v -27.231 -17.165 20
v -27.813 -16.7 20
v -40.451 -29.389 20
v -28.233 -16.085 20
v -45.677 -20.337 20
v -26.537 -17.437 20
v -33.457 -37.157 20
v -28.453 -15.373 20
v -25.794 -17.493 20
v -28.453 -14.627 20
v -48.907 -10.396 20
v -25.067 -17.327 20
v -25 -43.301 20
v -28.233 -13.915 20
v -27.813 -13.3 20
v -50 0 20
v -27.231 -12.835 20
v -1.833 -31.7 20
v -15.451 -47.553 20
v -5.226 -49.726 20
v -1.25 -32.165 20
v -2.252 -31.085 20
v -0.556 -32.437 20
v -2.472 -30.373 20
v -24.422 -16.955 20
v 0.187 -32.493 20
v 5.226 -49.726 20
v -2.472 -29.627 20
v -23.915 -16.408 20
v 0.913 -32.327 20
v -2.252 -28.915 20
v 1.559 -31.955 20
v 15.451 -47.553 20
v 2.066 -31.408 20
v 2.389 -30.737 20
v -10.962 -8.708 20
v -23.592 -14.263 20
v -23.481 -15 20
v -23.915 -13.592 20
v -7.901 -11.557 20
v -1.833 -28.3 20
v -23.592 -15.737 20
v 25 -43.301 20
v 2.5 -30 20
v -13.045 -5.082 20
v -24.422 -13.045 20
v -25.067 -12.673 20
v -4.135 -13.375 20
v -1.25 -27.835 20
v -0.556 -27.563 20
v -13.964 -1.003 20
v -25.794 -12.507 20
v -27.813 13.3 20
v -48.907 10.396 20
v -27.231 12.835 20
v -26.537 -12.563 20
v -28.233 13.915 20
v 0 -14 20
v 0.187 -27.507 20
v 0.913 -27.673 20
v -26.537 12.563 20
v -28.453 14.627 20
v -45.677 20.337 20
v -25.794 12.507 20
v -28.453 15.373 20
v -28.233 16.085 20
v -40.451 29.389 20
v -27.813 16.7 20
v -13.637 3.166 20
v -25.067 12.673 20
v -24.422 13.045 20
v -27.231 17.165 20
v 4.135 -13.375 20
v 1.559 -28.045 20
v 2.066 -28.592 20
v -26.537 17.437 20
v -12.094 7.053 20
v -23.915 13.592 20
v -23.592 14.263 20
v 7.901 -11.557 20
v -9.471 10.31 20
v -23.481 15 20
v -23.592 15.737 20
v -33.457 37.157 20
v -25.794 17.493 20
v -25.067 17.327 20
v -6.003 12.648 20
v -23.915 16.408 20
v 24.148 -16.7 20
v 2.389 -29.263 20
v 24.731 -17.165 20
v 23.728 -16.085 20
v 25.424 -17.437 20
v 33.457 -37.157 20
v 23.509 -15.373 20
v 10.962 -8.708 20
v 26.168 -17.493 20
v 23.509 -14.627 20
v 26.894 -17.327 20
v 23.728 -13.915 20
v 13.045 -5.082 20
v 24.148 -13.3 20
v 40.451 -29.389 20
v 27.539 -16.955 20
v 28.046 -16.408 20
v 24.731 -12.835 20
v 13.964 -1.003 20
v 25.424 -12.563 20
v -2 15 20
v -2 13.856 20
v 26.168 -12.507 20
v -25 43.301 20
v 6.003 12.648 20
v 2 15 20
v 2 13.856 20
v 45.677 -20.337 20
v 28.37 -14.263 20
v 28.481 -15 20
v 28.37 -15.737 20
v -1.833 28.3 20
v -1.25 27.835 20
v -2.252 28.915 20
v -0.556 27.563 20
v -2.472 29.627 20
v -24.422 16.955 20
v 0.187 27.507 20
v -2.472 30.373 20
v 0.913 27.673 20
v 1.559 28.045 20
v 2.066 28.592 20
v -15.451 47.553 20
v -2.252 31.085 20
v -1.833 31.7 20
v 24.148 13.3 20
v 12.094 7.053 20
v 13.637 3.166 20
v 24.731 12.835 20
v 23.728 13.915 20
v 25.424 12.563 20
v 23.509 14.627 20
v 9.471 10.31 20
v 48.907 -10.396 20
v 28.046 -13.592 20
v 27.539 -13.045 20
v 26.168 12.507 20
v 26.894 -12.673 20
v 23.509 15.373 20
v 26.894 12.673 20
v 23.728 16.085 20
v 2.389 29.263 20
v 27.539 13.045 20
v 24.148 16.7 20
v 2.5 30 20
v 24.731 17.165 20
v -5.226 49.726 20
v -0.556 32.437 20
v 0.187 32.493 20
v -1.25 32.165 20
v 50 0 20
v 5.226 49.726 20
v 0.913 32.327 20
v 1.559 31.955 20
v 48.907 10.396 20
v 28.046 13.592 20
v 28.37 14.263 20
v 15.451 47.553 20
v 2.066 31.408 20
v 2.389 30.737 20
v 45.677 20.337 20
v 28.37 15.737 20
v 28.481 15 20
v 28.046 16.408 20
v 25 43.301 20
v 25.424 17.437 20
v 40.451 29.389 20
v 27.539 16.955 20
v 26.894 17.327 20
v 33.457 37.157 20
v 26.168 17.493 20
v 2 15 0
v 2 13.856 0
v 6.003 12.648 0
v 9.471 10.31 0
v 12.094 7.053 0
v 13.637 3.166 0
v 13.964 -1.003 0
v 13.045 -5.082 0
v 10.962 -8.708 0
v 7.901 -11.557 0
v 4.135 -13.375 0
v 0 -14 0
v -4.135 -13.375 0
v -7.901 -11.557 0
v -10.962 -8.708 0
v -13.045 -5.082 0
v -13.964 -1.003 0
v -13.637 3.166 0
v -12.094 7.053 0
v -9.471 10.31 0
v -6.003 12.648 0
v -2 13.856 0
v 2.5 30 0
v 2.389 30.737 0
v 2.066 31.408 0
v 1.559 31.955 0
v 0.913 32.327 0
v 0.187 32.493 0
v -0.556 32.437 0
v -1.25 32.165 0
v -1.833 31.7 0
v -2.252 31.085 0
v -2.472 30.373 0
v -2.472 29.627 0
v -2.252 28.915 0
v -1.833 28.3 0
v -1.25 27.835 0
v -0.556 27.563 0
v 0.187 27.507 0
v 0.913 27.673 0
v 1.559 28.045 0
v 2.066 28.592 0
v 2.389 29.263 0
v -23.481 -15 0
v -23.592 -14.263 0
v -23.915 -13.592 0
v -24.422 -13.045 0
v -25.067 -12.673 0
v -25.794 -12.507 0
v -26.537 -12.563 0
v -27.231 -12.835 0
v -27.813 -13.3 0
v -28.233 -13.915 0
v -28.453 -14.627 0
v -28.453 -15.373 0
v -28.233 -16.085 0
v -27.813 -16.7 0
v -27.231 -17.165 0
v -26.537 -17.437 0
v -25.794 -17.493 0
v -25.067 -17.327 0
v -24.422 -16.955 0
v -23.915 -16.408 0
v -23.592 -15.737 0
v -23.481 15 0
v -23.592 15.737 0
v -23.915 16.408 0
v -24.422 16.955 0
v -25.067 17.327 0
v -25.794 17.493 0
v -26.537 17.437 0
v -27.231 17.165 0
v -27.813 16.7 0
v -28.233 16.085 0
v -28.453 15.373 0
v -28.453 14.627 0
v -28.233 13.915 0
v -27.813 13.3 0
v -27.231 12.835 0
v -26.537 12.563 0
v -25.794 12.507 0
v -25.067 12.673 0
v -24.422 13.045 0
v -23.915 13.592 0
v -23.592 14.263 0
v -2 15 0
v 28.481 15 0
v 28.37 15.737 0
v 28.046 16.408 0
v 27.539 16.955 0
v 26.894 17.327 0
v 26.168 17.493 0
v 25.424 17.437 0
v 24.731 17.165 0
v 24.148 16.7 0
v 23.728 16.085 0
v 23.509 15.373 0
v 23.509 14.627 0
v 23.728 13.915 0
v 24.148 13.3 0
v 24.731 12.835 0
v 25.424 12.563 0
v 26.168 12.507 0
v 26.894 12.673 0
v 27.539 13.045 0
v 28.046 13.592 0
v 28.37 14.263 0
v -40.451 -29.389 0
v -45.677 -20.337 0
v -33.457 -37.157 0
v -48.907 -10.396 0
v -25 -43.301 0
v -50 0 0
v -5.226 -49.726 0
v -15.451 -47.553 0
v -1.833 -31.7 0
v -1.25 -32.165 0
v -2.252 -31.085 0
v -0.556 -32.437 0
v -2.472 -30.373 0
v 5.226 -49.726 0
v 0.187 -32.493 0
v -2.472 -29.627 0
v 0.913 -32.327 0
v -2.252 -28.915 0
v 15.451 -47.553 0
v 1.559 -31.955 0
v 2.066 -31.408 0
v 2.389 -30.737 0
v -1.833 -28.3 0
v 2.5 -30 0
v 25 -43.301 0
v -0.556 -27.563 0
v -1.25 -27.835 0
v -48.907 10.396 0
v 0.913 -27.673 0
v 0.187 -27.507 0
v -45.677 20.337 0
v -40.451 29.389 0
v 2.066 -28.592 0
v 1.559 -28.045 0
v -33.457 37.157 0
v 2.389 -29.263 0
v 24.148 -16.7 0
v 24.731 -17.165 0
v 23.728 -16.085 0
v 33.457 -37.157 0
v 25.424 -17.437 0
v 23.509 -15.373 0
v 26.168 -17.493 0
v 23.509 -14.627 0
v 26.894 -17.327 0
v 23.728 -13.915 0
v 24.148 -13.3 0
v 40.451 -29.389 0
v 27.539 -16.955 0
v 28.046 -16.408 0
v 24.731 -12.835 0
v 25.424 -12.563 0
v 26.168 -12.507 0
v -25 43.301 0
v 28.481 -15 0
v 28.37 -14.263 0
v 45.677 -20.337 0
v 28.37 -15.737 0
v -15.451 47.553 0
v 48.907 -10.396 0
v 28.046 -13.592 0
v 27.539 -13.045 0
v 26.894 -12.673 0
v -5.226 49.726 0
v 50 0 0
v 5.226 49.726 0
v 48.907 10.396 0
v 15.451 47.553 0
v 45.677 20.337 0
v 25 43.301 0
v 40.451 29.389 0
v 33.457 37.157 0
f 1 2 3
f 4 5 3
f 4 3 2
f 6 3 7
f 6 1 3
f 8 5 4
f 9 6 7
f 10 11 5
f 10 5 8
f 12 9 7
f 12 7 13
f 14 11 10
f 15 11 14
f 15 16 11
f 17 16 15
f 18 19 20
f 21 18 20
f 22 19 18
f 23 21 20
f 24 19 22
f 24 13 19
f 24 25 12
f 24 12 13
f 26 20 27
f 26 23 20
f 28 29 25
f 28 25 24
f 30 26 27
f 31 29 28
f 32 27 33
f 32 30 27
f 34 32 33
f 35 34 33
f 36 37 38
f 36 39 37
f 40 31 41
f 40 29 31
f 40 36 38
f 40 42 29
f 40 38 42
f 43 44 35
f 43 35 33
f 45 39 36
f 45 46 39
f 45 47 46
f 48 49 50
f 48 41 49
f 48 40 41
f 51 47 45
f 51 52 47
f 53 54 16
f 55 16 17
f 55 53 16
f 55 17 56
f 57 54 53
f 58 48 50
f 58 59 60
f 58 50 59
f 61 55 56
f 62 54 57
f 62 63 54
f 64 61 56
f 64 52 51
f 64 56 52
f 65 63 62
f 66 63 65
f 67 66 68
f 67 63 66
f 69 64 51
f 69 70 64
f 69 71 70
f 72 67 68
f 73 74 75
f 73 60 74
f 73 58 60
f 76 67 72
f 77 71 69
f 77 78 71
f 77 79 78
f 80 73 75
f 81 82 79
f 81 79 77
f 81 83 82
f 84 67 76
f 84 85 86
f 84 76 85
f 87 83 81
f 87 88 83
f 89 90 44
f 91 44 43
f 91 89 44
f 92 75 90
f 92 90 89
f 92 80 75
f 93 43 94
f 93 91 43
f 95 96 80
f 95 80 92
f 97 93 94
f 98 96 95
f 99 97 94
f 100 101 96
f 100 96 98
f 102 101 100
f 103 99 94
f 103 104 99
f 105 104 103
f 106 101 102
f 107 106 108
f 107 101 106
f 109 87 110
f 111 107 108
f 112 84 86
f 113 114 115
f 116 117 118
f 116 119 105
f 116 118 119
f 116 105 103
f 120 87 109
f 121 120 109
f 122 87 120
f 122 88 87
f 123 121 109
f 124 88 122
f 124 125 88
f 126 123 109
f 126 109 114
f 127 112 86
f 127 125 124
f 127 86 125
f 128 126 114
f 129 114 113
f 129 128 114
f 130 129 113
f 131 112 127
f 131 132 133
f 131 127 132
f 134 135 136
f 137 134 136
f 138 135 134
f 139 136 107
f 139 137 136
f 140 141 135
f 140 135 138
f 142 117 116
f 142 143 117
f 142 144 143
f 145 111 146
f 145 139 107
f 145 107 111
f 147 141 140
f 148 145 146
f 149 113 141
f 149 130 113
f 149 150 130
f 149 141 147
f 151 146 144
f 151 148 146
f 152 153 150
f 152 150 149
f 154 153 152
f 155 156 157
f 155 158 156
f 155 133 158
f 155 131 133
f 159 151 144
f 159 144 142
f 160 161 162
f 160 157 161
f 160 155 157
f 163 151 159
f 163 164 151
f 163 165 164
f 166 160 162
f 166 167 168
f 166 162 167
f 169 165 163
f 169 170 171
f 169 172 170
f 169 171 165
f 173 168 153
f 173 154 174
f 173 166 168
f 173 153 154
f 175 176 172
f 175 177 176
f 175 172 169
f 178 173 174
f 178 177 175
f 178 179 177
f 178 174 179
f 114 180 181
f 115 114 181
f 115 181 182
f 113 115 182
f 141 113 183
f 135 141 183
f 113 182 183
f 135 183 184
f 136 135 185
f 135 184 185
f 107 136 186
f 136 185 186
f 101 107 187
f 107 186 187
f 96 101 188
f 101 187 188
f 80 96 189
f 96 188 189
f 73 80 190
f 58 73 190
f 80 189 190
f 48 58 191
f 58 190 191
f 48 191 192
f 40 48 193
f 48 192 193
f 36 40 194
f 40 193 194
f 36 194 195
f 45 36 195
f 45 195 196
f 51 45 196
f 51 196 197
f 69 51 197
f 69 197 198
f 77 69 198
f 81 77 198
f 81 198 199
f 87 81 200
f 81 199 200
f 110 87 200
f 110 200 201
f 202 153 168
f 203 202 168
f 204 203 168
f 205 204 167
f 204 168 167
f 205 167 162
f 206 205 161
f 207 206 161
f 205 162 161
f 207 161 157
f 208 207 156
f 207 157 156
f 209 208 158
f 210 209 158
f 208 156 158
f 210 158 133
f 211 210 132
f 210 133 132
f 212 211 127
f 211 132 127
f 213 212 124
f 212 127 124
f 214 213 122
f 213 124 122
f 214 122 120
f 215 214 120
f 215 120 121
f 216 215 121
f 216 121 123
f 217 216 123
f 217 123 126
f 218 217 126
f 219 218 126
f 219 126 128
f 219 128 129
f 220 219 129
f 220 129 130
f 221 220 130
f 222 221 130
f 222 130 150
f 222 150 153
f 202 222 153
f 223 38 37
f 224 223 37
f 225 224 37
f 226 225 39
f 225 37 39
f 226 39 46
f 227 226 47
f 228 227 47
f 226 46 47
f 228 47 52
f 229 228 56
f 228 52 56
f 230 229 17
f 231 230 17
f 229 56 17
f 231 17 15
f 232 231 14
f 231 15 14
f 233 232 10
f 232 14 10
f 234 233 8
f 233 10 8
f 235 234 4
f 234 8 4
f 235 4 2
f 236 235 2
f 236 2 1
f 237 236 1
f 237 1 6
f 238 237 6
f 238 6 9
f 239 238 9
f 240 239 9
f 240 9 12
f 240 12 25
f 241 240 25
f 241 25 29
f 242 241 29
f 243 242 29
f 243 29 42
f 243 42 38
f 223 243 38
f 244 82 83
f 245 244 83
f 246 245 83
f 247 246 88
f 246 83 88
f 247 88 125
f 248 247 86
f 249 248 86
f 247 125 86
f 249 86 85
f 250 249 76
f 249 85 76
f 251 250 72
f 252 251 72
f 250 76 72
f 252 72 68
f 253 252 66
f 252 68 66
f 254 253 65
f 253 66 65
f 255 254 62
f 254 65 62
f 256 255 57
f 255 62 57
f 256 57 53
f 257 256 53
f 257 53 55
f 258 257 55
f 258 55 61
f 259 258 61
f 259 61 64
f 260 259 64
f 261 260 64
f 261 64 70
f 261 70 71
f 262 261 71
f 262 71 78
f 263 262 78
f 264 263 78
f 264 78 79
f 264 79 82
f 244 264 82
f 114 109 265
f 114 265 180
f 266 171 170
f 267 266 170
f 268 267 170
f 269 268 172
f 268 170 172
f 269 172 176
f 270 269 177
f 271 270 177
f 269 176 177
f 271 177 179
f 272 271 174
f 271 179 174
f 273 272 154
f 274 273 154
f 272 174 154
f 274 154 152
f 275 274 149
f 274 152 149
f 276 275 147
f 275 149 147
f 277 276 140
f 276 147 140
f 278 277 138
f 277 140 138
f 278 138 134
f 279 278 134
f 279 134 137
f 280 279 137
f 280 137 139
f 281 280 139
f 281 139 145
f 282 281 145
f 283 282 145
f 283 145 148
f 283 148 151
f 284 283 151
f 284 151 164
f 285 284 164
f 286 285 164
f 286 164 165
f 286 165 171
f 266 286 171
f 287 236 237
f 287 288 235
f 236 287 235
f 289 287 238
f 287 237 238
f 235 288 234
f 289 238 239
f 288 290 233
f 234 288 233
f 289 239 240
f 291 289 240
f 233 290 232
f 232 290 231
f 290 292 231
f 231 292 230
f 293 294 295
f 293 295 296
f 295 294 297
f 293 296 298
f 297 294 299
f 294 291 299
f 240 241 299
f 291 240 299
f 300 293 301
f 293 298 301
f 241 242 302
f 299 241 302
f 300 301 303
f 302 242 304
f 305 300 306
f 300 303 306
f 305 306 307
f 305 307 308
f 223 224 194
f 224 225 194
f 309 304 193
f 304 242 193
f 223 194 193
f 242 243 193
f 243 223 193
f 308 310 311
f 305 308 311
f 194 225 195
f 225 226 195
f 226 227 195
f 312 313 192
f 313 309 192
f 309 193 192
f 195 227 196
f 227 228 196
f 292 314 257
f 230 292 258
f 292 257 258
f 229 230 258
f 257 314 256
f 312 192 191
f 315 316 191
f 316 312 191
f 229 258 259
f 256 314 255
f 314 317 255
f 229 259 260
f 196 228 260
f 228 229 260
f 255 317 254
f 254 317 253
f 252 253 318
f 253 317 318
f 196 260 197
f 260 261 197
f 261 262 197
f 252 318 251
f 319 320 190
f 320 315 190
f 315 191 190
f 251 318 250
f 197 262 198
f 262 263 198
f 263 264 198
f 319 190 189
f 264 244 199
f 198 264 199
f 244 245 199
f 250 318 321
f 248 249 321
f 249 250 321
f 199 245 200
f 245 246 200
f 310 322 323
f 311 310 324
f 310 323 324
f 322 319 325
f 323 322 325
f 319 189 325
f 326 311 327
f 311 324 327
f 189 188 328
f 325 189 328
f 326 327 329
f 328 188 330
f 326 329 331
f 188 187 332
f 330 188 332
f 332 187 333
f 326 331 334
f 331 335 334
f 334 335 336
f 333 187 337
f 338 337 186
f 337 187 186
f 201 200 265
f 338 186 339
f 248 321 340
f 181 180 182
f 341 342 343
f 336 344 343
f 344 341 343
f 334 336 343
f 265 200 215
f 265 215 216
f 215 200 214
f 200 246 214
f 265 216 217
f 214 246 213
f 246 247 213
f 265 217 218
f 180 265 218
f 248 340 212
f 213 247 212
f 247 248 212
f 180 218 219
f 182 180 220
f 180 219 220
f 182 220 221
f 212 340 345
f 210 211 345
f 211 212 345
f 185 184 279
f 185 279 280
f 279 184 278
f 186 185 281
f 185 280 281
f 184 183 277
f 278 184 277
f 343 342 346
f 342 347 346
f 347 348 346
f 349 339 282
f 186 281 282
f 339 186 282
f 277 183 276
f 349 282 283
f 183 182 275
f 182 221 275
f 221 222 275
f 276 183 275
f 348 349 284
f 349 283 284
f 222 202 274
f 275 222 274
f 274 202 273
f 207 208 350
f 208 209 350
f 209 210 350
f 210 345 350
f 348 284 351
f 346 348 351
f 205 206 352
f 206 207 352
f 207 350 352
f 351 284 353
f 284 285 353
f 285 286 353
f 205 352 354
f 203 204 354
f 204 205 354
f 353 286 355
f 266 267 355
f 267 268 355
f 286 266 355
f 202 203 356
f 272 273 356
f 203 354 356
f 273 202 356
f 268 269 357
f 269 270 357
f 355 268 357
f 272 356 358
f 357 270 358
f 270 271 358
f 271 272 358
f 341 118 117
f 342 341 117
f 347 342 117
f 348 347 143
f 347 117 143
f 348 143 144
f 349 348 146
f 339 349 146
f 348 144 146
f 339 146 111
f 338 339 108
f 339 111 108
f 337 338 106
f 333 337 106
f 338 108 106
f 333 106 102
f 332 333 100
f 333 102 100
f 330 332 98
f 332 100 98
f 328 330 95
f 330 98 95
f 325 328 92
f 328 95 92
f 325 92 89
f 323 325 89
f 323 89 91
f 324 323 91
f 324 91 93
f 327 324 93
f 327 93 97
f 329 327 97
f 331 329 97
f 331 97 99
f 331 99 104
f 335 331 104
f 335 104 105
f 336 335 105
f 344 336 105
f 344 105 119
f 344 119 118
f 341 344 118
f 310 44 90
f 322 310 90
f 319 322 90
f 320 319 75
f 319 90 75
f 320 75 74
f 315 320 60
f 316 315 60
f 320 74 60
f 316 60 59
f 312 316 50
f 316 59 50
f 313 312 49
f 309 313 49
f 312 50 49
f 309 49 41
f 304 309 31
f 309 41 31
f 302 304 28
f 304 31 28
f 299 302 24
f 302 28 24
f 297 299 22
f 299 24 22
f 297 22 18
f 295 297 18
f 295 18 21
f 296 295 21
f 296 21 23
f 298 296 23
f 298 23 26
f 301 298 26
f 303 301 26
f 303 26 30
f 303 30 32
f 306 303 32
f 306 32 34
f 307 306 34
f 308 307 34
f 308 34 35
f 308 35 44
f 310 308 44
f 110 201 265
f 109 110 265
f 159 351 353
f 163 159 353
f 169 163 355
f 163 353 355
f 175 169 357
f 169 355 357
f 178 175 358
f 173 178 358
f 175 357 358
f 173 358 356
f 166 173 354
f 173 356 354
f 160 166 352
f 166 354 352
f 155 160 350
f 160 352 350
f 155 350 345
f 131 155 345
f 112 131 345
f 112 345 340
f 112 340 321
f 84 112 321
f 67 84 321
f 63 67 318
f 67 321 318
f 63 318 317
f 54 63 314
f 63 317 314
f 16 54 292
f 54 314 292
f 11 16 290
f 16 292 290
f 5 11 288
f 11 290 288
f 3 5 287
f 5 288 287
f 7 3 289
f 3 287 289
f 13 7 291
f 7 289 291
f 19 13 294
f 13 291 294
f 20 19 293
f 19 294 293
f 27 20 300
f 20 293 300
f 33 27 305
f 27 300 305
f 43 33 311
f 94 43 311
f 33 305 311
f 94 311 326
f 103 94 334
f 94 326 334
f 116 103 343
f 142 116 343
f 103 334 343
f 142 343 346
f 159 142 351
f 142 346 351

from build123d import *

# Parameters (mm, degrees)
SKETCH1_R           = 50
BOSS_EXTRUDE1_DEPTH = 20
SKETCH2_R           = 2.5
CUT_EXTRUDE1_DEPTH  = 74.484692283


with BuildPart() as part:
    # Sketch1 → Boss-Extrude1 (new body)
    with BuildSketch(Plane.XY):
        Circle(SKETCH1_R)
        with BuildLine():
            Line((-2, 13.856406461), (-2, 15))
            Line((-2, 15), (2, 15))
            Line((2, 15), (2, 13.856406461))
            ThreePointArc((2, 13.856406461), (0, -14), (-2, 13.856406461))
        make_face(mode=Mode.SUBTRACT)
    extrude(amount=BOSS_EXTRUDE1_DEPTH)

    # Sketch2 → Cut-Extrude1 (cut, through all)
    with BuildSketch(Plane.XY.offset(20)):
        with Locations((0, -30)):
            Circle(SKETCH2_R)
        with Locations((-25.980762114, -15)):
            Circle(SKETCH2_R)
        with Locations((-25.980762114, 15)):
            Circle(SKETCH2_R)
        with Locations((0, 30)):
            Circle(SKETCH2_R)
        with Locations((25.980762114, 15)):
            Circle(SKETCH2_R)
        with Locations((25.980762114, -15)):
            Circle(SKETCH2_R)
    extrude(amount=-CUT_EXTRUDE1_DEPTH, mode=Mode.SUBTRACT)


solid = part.part
